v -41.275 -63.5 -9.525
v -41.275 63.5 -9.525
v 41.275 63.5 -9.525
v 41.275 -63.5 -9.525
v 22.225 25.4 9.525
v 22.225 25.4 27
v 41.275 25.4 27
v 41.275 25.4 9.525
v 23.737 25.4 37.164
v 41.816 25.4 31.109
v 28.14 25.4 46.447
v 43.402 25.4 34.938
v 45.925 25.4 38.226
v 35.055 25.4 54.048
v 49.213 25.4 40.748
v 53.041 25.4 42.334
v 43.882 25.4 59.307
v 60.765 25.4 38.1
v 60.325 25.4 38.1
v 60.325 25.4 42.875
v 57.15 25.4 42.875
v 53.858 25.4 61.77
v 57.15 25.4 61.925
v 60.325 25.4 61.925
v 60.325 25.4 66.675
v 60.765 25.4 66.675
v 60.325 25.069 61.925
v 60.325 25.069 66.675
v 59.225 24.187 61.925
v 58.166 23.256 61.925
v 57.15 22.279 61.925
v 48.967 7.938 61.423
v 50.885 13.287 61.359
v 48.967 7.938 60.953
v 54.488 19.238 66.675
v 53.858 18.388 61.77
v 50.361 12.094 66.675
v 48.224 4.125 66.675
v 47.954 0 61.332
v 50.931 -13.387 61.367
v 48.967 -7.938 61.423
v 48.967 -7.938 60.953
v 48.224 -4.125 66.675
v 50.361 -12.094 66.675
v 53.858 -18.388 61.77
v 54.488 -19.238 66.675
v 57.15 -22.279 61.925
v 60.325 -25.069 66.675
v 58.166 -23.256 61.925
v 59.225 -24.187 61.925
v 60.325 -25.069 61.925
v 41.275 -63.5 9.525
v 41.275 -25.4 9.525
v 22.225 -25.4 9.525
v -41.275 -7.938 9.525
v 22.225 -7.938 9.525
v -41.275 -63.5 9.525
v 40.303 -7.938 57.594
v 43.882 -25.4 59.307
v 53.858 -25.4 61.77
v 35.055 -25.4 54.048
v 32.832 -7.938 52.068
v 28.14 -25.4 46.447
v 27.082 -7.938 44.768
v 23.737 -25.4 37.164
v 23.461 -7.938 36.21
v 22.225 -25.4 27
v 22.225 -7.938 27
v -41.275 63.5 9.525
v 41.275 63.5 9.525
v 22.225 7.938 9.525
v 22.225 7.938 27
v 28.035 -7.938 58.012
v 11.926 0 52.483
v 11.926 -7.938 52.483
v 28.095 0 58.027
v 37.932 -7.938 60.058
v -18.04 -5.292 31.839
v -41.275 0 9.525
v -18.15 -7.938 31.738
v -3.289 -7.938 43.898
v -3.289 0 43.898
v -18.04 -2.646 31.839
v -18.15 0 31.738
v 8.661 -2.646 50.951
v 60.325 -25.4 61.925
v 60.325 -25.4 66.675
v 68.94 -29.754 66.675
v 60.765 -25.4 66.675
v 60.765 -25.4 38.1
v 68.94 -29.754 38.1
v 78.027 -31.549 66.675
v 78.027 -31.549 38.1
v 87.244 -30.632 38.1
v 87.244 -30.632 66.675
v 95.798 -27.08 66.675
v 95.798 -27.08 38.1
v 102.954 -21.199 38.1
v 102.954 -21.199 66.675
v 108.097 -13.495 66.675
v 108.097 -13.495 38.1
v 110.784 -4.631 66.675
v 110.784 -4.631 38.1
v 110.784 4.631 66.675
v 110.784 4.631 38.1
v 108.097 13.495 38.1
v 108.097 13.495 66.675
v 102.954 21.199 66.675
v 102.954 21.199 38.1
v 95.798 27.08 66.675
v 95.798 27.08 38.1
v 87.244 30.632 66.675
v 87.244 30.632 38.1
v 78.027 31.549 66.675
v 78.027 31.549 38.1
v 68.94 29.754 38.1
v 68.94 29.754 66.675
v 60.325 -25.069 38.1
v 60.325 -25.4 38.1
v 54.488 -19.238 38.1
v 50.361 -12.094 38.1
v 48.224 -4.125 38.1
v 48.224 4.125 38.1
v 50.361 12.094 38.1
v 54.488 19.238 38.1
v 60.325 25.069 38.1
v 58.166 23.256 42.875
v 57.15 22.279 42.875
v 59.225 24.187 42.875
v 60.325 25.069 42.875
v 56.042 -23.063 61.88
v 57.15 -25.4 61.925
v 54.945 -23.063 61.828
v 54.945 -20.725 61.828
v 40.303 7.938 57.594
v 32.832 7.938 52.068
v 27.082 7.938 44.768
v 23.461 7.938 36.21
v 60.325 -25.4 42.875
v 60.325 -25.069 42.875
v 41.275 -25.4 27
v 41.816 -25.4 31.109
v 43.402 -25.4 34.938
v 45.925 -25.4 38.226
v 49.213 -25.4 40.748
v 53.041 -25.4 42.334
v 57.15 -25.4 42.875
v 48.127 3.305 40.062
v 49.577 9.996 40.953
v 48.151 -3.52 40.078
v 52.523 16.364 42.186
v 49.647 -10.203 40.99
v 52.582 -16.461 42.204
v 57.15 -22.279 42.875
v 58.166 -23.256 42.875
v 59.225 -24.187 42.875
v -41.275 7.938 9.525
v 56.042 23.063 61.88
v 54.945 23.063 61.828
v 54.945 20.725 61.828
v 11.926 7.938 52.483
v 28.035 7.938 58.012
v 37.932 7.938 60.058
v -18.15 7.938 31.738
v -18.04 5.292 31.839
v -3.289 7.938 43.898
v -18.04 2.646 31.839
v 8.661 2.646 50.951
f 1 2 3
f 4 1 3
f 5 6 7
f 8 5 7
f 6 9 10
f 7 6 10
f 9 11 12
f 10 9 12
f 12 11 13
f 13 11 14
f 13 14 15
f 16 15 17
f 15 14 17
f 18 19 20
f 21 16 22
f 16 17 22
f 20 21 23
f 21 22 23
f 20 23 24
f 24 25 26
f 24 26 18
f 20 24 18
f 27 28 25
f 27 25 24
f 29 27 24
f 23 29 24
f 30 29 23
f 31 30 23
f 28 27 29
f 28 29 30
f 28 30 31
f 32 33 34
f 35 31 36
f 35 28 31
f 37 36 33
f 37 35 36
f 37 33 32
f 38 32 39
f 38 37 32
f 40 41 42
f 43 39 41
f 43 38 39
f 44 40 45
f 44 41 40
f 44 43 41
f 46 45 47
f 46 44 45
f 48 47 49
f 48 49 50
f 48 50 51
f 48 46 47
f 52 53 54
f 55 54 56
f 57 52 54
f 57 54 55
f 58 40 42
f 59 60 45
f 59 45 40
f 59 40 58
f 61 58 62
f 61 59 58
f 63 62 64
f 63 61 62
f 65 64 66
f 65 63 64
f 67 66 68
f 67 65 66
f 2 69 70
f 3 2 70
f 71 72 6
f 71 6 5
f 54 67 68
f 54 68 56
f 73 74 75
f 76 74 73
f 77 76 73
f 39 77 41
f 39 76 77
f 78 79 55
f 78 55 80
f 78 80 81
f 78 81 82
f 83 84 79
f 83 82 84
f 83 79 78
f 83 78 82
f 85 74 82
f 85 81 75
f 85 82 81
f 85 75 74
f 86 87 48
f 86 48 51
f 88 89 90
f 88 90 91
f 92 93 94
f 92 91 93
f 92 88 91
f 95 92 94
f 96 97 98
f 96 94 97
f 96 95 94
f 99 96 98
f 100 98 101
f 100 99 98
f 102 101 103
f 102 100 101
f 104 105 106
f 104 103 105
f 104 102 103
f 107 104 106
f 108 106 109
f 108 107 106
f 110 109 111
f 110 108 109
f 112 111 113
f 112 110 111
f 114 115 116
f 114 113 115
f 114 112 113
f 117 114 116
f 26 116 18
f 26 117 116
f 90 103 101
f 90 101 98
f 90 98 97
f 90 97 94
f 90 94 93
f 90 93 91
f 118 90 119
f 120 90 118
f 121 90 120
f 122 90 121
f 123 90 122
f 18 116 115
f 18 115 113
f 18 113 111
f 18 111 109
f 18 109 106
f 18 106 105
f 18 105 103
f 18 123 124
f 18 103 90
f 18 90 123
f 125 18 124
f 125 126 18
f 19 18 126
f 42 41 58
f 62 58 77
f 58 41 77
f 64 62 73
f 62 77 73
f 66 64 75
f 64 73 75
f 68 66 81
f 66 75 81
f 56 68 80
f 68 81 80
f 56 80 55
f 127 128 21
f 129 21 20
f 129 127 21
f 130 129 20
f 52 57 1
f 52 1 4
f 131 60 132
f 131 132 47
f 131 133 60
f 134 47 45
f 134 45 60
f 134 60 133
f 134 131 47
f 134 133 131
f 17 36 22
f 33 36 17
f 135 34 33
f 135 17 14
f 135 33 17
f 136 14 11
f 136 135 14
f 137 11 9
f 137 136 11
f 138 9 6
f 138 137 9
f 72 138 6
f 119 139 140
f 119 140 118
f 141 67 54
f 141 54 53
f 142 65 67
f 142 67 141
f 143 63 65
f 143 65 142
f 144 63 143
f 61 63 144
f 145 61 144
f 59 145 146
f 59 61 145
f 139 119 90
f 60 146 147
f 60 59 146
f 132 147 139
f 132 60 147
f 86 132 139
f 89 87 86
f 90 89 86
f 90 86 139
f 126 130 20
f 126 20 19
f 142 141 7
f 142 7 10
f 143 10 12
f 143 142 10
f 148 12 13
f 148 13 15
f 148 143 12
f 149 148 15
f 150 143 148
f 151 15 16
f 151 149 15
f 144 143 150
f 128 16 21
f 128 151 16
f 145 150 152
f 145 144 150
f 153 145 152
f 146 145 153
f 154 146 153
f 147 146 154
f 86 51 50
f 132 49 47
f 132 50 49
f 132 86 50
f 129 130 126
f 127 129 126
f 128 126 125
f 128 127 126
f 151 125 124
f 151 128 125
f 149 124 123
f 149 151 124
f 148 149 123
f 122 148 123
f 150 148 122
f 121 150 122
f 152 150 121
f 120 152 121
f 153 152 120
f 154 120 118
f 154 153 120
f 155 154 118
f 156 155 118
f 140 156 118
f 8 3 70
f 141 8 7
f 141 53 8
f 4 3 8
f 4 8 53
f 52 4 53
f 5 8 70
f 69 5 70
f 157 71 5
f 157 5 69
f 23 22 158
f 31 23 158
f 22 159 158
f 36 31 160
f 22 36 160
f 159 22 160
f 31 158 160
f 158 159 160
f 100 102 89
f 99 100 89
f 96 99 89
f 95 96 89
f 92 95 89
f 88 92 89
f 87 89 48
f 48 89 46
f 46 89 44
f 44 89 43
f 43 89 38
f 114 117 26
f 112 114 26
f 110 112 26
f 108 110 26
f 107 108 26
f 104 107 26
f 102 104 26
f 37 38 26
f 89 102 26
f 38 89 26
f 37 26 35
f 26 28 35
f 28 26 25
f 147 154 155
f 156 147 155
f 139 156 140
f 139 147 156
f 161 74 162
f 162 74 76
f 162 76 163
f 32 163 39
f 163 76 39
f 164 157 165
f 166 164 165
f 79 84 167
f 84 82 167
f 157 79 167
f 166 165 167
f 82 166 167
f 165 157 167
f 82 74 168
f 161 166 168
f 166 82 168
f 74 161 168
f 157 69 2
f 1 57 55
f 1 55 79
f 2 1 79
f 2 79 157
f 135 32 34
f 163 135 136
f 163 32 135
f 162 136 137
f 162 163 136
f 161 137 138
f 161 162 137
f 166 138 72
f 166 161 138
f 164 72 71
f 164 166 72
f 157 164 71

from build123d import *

# Parameters (mm, degrees)
F1_DEPTH = 25.4
F2_DEPTH = 7.9375
F0_W     = 31.585604
F0_H     = 28.575
F4_DEPTH = 63.5


with BuildPart() as f1:
    # F0 (on Front) → F1 (new body, symmetric)
    with BuildSketch(Plane.XZ):
        Polygon((60.325, 66.675), (60.325, 61.9252), (60.325, 42.8752), (60.325, 38.1), (79.539396, 38.1), (79.539396, 66.675), align=None)
        with BuildLine():
            Line((22.225, 9.525), (41.275, 9.525))
            Line((41.275, 9.525), (41.275, 27.0002))
            ThreePointArc((41.275, 27.0002), (45.92468, 38.22552), (57.15, 42.8752))
            Line((57.15, 42.8752), (60.325, 42.8752))
            Line((60.325, 42.8752), (60.325, 61.9252))
            Line((60.325, 61.9252), (57.15, 61.9252))
            add(Edge.make_bspline(
                [(53.857929, 61.769697), (54.939593, 61.830793), (56.036819, 61.882698), (57.15, 61.9252)],
                knots=[109.332626, 109.332626, 109.332626, 109.332626, 111.504536, 111.504536, 111.504536, 111.504536], degree=3))
            ThreePointArc((53.857929, 61.769697), (31.31658, 50.503179), (22.225, 27.0002))
            Line((22.225, 27.0002), (22.225, 9.525))
        make_face()
    extrude(amount=F1_DEPTH, both=True)

    # F0 (on Front) → F2 (join, symmetric)
    with BuildSketch(Plane.XZ):
        with BuildLine():
            add(Edge.make_bspline(
                [(-41.275, 9.525), (-15.607869, 32.326474), (-0.592367, 58.694147), (53.857929, 61.769697)],
                knots=[0, 0, 0, 0, 109.332626, 109.332626, 109.332626, 109.332626], degree=3))
            Line((-41.275, 9.525), (22.225, 9.525))
            Line((22.225, 9.525), (22.225, 27.0002))
            ThreePointArc((22.225, 27.0002), (31.31658, 50.503179), (53.857929, 61.769697))
        make_face()
    extrude(amount=F2_DEPTH, both=True)

    # F0 (on Front) → F3 (revolve)
    with BuildSketch(Plane.XZ):
        with Locations((95.332198, 52.3875)):
            Rectangle(F0_W, F0_H)
    revolve(axis=Axis((79.539396, 0, 52.3875), (0, 0, 1)))

    # F0 (on Front) → F4 (join, symmetric)
    with BuildSketch(Plane.XZ):
        Polygon((-41.275, 9.525), (-41.275, -9.525), (41.275, -9.525), (41.275, 9.525), (22.225, 9.525), align=None)
    extrude(amount=F4_DEPTH, both=True)


solid = f1.part
